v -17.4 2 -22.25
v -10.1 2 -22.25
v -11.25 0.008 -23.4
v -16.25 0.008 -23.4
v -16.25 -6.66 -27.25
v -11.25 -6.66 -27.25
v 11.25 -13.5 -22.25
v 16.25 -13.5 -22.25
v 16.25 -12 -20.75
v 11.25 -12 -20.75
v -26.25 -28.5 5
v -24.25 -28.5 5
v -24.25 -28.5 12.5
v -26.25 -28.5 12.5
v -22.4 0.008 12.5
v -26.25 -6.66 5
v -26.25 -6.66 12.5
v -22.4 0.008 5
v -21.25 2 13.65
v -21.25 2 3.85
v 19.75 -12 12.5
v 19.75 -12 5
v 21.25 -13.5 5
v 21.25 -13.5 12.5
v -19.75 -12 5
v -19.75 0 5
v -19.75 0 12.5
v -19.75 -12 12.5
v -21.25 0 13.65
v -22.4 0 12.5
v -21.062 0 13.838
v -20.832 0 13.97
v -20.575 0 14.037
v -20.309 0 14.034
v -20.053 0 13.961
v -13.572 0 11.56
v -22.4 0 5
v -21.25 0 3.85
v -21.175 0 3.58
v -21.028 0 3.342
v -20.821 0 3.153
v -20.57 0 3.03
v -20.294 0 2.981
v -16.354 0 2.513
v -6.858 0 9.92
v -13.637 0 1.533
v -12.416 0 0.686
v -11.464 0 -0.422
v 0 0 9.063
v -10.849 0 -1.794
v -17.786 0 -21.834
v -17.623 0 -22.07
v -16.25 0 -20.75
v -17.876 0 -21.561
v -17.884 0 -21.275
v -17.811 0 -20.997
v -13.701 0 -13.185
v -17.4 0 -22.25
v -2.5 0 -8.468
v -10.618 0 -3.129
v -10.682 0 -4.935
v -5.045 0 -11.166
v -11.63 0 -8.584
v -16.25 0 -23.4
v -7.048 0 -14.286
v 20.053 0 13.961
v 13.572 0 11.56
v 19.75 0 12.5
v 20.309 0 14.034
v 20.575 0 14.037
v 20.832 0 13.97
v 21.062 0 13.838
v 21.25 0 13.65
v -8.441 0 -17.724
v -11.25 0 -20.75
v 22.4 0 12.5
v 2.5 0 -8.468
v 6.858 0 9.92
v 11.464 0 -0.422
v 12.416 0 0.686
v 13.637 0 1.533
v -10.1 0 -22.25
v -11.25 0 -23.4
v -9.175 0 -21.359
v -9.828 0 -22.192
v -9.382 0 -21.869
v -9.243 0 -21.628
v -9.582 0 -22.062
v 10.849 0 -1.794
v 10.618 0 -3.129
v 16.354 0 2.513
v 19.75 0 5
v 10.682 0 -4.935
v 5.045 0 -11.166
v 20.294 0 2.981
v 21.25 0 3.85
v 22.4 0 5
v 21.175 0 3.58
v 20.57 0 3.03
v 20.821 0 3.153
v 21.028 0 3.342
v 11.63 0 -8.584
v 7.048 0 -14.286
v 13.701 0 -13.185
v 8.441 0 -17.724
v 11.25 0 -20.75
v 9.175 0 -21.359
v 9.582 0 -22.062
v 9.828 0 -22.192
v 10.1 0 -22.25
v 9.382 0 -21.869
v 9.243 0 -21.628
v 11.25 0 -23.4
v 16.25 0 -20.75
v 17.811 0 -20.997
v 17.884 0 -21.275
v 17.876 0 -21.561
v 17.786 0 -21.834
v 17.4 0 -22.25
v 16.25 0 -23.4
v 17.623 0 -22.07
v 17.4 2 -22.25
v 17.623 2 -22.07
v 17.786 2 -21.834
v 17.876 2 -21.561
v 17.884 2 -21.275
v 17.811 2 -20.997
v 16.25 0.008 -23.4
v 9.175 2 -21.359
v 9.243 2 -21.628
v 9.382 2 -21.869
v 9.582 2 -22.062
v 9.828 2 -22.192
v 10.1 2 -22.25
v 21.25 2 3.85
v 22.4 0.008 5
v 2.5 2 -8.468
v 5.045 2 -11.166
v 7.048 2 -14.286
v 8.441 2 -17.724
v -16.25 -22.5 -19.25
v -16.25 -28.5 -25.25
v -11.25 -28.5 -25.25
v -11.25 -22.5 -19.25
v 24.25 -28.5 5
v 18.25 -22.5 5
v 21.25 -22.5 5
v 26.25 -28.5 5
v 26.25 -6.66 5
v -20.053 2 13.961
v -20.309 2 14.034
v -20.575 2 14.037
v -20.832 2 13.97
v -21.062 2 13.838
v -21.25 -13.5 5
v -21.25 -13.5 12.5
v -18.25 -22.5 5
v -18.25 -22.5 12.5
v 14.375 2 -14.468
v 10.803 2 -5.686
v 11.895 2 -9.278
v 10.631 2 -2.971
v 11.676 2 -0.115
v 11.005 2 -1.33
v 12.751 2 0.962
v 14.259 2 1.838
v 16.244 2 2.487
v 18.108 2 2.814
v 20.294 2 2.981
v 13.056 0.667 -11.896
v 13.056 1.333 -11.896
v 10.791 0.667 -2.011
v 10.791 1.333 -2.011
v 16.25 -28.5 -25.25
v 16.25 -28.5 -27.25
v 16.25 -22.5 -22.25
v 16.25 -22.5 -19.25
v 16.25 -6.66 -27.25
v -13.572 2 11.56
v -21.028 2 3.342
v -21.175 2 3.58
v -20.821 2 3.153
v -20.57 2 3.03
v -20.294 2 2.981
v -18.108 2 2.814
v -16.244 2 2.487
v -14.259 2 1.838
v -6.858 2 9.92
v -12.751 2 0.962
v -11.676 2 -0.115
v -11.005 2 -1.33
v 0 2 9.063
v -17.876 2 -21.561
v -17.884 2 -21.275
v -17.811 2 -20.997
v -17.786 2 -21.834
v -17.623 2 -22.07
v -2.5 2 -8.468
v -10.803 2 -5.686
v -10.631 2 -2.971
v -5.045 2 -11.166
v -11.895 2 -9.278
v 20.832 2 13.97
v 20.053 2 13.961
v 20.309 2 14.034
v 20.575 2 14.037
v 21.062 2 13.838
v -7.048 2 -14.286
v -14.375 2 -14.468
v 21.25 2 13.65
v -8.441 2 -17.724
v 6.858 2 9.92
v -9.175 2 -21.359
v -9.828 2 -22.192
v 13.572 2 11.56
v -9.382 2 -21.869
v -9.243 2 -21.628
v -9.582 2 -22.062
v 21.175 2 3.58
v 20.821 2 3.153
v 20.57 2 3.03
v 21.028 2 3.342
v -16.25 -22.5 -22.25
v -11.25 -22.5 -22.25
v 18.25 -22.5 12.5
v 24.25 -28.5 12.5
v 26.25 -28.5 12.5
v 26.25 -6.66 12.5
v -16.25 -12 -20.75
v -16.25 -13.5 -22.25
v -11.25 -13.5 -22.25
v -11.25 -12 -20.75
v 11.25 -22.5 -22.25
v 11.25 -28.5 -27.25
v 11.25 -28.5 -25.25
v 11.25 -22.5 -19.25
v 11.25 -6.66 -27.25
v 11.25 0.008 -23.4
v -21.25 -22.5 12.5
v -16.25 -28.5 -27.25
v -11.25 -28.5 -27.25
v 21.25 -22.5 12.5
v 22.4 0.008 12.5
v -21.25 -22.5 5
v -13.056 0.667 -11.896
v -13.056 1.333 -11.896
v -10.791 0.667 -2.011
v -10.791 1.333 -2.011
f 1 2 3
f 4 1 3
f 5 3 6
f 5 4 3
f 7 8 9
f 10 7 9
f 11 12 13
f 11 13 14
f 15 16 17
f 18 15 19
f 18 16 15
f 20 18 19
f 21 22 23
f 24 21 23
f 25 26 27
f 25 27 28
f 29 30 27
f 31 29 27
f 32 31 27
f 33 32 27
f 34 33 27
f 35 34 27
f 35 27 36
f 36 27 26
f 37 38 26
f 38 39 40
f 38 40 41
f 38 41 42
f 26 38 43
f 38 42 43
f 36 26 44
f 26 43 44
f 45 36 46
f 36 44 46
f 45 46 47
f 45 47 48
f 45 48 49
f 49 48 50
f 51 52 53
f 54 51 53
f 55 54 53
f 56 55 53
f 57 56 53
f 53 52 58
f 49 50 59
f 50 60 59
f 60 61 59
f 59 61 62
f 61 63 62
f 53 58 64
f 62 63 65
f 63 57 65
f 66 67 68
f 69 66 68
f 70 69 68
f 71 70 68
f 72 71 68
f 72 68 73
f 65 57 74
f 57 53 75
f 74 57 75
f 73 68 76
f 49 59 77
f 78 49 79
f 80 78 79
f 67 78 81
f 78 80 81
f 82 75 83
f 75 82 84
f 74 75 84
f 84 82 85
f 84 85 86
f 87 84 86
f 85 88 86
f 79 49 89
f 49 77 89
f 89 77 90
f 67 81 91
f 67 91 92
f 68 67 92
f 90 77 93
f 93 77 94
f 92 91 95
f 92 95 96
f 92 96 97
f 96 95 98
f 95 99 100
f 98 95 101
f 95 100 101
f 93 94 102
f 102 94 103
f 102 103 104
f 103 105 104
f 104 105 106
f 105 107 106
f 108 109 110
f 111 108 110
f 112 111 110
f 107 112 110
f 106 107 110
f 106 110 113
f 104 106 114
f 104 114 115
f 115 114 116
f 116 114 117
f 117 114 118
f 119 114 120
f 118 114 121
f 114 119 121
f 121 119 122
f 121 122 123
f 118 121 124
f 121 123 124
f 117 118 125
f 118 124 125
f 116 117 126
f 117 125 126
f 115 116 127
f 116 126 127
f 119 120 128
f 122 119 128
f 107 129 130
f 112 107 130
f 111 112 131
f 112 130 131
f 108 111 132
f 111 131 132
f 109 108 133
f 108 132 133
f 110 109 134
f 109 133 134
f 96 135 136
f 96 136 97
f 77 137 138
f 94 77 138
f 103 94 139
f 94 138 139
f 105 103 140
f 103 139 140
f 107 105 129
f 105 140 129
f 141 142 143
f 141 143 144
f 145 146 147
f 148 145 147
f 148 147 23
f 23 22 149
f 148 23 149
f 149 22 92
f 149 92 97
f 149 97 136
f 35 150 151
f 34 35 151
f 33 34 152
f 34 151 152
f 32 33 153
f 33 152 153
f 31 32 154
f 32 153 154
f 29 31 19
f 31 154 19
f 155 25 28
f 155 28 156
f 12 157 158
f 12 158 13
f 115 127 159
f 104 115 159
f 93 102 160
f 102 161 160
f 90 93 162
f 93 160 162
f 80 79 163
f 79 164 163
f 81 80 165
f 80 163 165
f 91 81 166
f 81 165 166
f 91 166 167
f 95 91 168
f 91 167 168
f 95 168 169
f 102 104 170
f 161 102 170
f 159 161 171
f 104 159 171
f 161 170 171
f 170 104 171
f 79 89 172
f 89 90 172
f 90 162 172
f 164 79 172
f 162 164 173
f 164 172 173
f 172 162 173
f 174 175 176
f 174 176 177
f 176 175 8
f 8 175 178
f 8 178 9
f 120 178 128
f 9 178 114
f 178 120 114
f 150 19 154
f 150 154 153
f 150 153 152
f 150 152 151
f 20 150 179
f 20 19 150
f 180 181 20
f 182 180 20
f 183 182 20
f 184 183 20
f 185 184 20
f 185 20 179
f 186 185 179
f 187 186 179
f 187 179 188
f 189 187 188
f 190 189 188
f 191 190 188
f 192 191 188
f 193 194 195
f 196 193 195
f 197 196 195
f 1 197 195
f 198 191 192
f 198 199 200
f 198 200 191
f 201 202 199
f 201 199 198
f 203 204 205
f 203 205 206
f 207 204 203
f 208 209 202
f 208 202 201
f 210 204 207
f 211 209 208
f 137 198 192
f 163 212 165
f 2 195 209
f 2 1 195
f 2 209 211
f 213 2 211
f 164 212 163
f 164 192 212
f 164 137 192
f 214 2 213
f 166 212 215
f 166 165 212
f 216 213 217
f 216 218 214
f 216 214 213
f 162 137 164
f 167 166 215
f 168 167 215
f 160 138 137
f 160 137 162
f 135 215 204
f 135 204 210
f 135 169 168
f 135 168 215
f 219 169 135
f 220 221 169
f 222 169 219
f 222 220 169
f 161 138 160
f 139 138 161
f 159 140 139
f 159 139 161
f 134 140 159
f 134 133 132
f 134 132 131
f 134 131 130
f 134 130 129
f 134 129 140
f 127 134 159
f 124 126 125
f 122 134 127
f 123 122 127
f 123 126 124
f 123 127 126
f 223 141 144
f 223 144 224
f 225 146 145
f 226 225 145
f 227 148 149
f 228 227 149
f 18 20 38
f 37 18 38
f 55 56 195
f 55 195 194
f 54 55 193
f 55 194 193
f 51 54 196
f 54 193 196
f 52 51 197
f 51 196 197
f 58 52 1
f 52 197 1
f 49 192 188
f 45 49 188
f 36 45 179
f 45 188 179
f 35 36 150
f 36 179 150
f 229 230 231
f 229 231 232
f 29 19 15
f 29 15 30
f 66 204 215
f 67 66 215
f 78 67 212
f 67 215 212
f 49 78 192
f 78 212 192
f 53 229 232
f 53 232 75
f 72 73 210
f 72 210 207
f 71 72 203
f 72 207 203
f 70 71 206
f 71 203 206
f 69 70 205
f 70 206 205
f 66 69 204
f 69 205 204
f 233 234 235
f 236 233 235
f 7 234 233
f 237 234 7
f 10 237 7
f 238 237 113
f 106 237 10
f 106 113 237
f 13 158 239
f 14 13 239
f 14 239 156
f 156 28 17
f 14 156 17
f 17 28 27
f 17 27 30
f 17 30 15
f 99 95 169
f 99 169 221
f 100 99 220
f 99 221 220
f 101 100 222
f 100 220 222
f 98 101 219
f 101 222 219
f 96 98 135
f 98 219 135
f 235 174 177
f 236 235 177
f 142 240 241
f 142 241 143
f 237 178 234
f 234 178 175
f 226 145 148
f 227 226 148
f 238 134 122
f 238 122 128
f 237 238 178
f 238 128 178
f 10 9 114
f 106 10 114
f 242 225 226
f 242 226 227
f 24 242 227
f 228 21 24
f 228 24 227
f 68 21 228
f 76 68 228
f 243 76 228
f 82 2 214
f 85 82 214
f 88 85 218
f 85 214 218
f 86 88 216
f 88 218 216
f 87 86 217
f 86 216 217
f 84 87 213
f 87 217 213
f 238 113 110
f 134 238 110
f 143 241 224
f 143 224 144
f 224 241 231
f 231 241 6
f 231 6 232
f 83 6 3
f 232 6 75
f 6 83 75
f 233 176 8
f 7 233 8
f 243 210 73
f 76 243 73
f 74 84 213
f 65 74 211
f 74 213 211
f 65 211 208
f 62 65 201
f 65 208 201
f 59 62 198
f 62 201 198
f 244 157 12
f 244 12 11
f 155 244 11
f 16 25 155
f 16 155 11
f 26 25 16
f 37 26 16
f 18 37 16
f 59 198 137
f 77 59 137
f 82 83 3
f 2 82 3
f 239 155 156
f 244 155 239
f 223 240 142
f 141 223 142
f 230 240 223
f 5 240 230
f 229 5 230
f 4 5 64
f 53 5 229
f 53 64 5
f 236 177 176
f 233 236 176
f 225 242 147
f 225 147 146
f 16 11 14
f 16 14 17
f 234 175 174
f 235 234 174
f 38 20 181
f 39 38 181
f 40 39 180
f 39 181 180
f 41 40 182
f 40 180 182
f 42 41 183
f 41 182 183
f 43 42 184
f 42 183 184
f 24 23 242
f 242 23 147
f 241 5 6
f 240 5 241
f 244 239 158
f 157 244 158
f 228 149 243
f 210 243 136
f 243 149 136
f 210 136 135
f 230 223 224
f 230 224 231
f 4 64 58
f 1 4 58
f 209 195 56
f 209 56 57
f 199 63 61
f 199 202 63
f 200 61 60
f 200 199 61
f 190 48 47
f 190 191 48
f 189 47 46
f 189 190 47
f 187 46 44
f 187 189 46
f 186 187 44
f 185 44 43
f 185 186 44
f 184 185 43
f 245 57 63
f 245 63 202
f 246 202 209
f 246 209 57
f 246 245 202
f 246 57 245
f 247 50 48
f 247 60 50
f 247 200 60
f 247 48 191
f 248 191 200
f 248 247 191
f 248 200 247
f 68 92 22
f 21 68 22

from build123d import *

# Parameters (mm, degrees)
SKETCH1_W           = 42.5
SKETCH1_H           = 44.5
BOSS_EXTRUDE1_DEPTH = 2
BOSS_EXTRUDE2_START = -27.25
BOSS_EXTRUDE2_DEPTH = 7.5
BOSS_EXTRUDE3_START = -5
BOSS_EXTRUDE3_DEPTH = 5
CUT_EXTRUDE3_DEPTH  = 5
CHAMFER1_SIZE       = 1.15
FILLET1_R           = 1


with BuildPart() as part:
    # Sketch1 → Boss-Extrude1 (new body)
    with BuildSketch(Plane(origin=(0, 0, 0), x_dir=(1, 0, 0), z_dir=(0, 1, 0))):
        Rectangle(SKETCH1_W, SKETCH1_H)
    extrude(amount=BOSS_EXTRUDE1_DEPTH)

    # Sketch2 → Boss-Extrude2 (add)
    with BuildSketch(Plane(origin=(0, 0, -22.25), x_dir=(-1, 0, 0), z_dir=(0, 0, -1)).offset(BOSS_EXTRUDE2_START)):
        Polygon((21.25, -22.5), (18.25, -22.5), (24.25, -28.5), (26.25, -28.5), (26.25, -18), (26.25, -6.660254038), (21.25, 2), (21.25, 0), (19.75, 0), (19.75, -12), (21.25, -13.5), align=None)
    boss_extrude2 = extrude(amount=-BOSS_EXTRUDE2_DEPTH)

    # Mirror1: Boss-Extrude2 across plane
    add(boss_extrude2.mirror(Plane(origin=(0, 0, 0), x_dir=(0, 0, 1), z_dir=(1, 0, 0))))

    # Sketch4 → Boss-Extrude3 (add)
    with BuildSketch(Plane(origin=(21.25, 0, 0), x_dir=(0, 0, -1), z_dir=(1, 0, 0)).offset(BOSS_EXTRUDE3_START)):
        Polygon((27.25, -6.660254038), (27.25, -28.5), (25.25, -28.5), (19.25, -22.5), (22.25, -22.5), (22.25, -13.5), (20.75, -12), (20.75, 0), (22.25, 0), (22.25, 2), align=None)
    boss_extrude3 = extrude(amount=-BOSS_EXTRUDE3_DEPTH)

    # Mirror2: Boss-Extrude3 across plane
    add(boss_extrude3.mirror(Plane(origin=(0, 0, 0), x_dir=(0, 0, 1), z_dir=(1, 0, 0))))

    # Sketch5 → Cut-Extrude3 (cut)
    with BuildSketch(Plane(origin=(0, 2, 0), x_dir=(1, 0, 0), z_dir=(0, 1, 0))):
        with BuildLine():
            ThreePointArc((0, -9.063025703), (-10.875563664, -10.802203854), (-21.25, -14.5))
            Line((-21.25, -14.5), (-21.25, -22.25))
            Line((-21.25, -22.25), (21.25, -22.25))
            Line((21.25, -22.25), (21.25, -14.5))
            ThreePointArc((21.25, -14.5), (10.875563664, -10.802203854), (0, -9.063025703))
        make_face()
        with BuildLine():
            Line((-21.25, 22.25), (-21.25, -3))
            add(Edge.make_bspline(
                [(-18.25, 22.25), (-16.81830639, 16.418600695), (-0.036255197, -2.877473786), (-21.25, -3)],
                knots=[0, 0, 0, 0, 1, 1, 1, 1], degree=3))
            Line((-18.25, 22.25), (-21.25, 22.25))
        make_face()
        with BuildLine():
            Line((-2.5, 8.468152214), (2.5, 8.468152214))
            ThreePointArc((2.5, 8.468152214), (7.249445146, 14.685907684), (9.25, 22.25))
            Line((9.25, 22.25), (-9.25, 22.25))
            ThreePointArc((-9.25, 22.25), (-7.249445146, 14.685907684), (-2.5, 8.468152214))
        make_face()
        with BuildLine():
            add(Edge.make_bspline(
                [(18.25, 22.25), (16.81830639, 16.418600695), (0.036255197, -2.877473786), (21.25, -3)],
                knots=[0, 0, 0, 0, 1, 1, 1, 1], degree=3))
            Line((21.25, -3), (21.25, 22.25))
            Line((21.25, 22.25), (18.25, 22.25))
        make_face()
    extrude(amount=-CUT_EXTRUDE3_DEPTH, mode=Mode.SUBTRACT)

    # Chamfer1
    chamfer1_edges = [part.edges().sort_by_distance(p)[0] for p in [
        (-11.25, 1, -22.25),
        (-21.25, 1, 12.5),
        (-21.25, 1, 5),
        (21.25, 1, 5),
        (21.25, 1, 12.5),
        (11.25, 1, -22.25),
        (16.25, 1, -22.25),
        (-16.25, 1, -22.25),
    ]]
    chamfer(chamfer1_edges, length=CHAMFER1_SIZE)

    # Fillet1
    # the kernel refuses this fillet: 1 mm, written as the material it takes off along each edge
    with BuildSketch(Plane(origin=(-21.25, 4.391127169, 3), x_dir=(0, 0, 1), z_dir=(0, -1, 0))) as fillet1_piece_1:
        with BuildLine():
            CenterArc((0.980089216, -0.991502292), FILLET1_R, 97.474747775, 80.505389302)
            Line((-0.019289453, -0.956256336), (-0.039277026, -0.955551417))
            ThreePointArc((-0.039277026, -0.955551417), (-0.026119359, -0.477798689), (-0.019999666, 0.000115514))
            Line((-0.019999666, 0.000115514), (0, 0.02))
            ThreePointArc((0, 0.02), (0.425, 0.02), (0.847398216, 0.019830046))
            Line((0.847398216, 0.019830046), (0.85, 0))
        make_face()
    extrude(amount=6.782254339, mode=Mode.SUBTRACT)
    with BuildSketch(Plane(origin=(-18.25, 5.318683713, -22.25), x_dir=(0.3309539081211192, 0, 0.9436469205690006), z_dir=(0, -1, 0))) as fillet1_piece_2:
        with BuildLine():
            CenterArc((1.261964238, -0.997851962), FILLET1_R, 86.243906852, 82.467431806)
            Line((0.281310822, -0.802099882), (0.261697754, -0.798184841))
            ThreePointArc((0.261697754, -0.798184841), (0.121782473, -0.407669019), (-0.018872938, -0.006619078))
            Line((-0.018872938, -0.006619078), (-0.001928232, 0.019906831))
            ThreePointArc((-0.001928232, 0.019906831), (0.664077557, 0.04586364), (1.32878367, 0.019957039))
            Line((1.32878367, 0.019957039), (1.327473485, 0))
        make_face()
    extrude(amount=8.637367425, mode=Mode.SUBTRACT)
    with BuildSketch(Plane(origin=(-9.25, 4.236352912, -22.25), x_dir=(-1, 0, 0), z_dir=(0, -1, 0))) as fillet1_piece_3:
        with BuildLine():
            CenterArc((0.919243583, -0.997599783), FILLET1_R, 93.970542278, 79.932192876)
            Line((-0.075099433, -0.891383179), (-0.094986293, -0.889258846))
            ThreePointArc((-0.094986293, -0.889258846), (-0.052494869, -0.444432453), (-0.01996196, 0.001232949))
            Line((-0.01996196, 0.001232949), (0, 0.02))
            ThreePointArc((0, 0.02), (0.425, 0.02), (0.848615128, 0.019951996))
            Line((0.848615128, 0.019951996), (0.85, 0))
        make_face()
    extrude(amount=6.472705825, mode=Mode.SUBTRACT)
    with BuildSketch(Plane(origin=(9.25, 4.236352912, -22.25), x_dir=(-0.08395302082723771, 0, 0.9964697136862621), z_dir=(0, -1, 0))) as fillet1_piece_4:
        with BuildLine():
            CenterArc((0.916904694, -0.999749905), FILLET1_R, 91.281442663, 79.932192876)
            Line((-0.071360068, -0.846999257), (-0.091125363, -0.843944244))
            ThreePointArc((-0.091125363, -0.843944244), (-0.055609428, -0.421820568), (-0.019929394, 0.00167906))
            Line((-0.019929394, 0.00167906), (0.000447271, 0.019994998))
            ThreePointArc((0.000447271, 0.019994998), (0.447270582, 0.0149981), (0.894093894, 0.019994998))
            Line((0.894093894, 0.019994998), (0.894541165, 0))
        make_face()
    extrude(amount=6.472705825, mode=Mode.SUBTRACT)
    with BuildSketch(Plane(origin=(18.25, 5.318683713, -22.25), x_dir=(-1, 0, 0), z_dir=(0, -1, 0))) as fillet1_piece_5:
        with BuildLine():
            CenterArc((1.359271928, -0.860605661), FILLET1_R, 120.615345392, 82.467431806)
            Line((0.439332538, -1.252666266), (0.42093375, -1.260507478))
            ThreePointArc((0.42093375, -1.260507478), (0.17649998, -0.641833493), (-0.019423176, -0.004768673))
            Line((-0.019423176, -0.004768673), (0, 0.02))
            ThreePointArc((0, 0.02), (0.425, 0.02), (0.839814561, 0.017212113))
            Line((0.839814561, 0.017212113), (0.85, 0))
        make_face()
    extrude(amount=8.637367425, mode=Mode.SUBTRACT)
    with BuildSketch(Plane(origin=(21.25, 4.391127169, 3), x_dir=(-0.9997966104440278, 0, -0.020167740196489006), z_dir=(0, -1, 0))) as fillet1_piece_6:
        with BuildLine():
            CenterArc((0.971534447, -0.999886236), FILLET1_R, 90.864258181, 80.505389302)
            Line((-0.017142579, -0.849827119), (-0.03691612, -0.846825937))
            ThreePointArc((-0.03691612, -0.846825937), (-0.028567222, -0.424510205), (-0.019995932, 0.000403355))
            Line((-0.019995932, 0.000403355), (0.000287858, 0.019997928))
            ThreePointArc((0.000287858, 0.019997928), (0.478228278, 0.016477927), (0.956149196, 0.019997725))
            Line((0.956149196, 0.019997725), (0.956450868, 0))
        make_face()
    extrude(amount=6.782254339, mode=Mode.SUBTRACT)
    with BuildSketch(Plane(origin=(21.25, 5.281576595, 14.5), x_dir=(0, 0, -1), z_dir=(0, -1, 0))) as fillet1_piece_7:
        with BuildLine():
            CenterArc((1.455421085, -0.79590534), FILLET1_R, 127.259148945, 76.371212097)
            Line((0.539270629, -1.196739897), (0.52094762, -1.204756588))
            ThreePointArc((0.52094762, -1.204756588), (0.254673852, -0.605111829), (-0.018143252, -0.008415604))
            Line((-0.018143252, -0.008415604), (0, 0.02))
            ThreePointArc((0, 0.02), (0.425, 0.02), (0.837891578, 0.015918107))
            Line((0.837891578, 0.015918107), (0.85, 0))
        make_face()
    extrude(amount=8.56315319, mode=Mode.SUBTRACT)
    with BuildSketch(Plane(origin=(-21.25, 5.281576595, 14.5), x_dir=(0, 0, -1), z_dir=(0, -1, 0))) as fillet1_piece_8:
        with BuildLine():
            CenterArc((1.455421085, 0.79590534), FILLET1_R, 156.369638958, 76.371212097)
            Line((0.539270629, 1.196739897), (0.52094762, 1.204756588))
            ThreePointArc((0.52094762, 1.204756588), (0.254673852, 0.605111829), (-0.018143252, 0.008415604))
            Line((-0.018143252, 0.008415604), (0, -0.02))
            ThreePointArc((0, -0.02), (0.425, -0.02), (0.837891578, -0.015918107))
            Line((0.837891578, -0.015918107), (0.85, 0))
        make_face()
    extrude(amount=8.56315319, mode=Mode.SUBTRACT)


solid = part.part
